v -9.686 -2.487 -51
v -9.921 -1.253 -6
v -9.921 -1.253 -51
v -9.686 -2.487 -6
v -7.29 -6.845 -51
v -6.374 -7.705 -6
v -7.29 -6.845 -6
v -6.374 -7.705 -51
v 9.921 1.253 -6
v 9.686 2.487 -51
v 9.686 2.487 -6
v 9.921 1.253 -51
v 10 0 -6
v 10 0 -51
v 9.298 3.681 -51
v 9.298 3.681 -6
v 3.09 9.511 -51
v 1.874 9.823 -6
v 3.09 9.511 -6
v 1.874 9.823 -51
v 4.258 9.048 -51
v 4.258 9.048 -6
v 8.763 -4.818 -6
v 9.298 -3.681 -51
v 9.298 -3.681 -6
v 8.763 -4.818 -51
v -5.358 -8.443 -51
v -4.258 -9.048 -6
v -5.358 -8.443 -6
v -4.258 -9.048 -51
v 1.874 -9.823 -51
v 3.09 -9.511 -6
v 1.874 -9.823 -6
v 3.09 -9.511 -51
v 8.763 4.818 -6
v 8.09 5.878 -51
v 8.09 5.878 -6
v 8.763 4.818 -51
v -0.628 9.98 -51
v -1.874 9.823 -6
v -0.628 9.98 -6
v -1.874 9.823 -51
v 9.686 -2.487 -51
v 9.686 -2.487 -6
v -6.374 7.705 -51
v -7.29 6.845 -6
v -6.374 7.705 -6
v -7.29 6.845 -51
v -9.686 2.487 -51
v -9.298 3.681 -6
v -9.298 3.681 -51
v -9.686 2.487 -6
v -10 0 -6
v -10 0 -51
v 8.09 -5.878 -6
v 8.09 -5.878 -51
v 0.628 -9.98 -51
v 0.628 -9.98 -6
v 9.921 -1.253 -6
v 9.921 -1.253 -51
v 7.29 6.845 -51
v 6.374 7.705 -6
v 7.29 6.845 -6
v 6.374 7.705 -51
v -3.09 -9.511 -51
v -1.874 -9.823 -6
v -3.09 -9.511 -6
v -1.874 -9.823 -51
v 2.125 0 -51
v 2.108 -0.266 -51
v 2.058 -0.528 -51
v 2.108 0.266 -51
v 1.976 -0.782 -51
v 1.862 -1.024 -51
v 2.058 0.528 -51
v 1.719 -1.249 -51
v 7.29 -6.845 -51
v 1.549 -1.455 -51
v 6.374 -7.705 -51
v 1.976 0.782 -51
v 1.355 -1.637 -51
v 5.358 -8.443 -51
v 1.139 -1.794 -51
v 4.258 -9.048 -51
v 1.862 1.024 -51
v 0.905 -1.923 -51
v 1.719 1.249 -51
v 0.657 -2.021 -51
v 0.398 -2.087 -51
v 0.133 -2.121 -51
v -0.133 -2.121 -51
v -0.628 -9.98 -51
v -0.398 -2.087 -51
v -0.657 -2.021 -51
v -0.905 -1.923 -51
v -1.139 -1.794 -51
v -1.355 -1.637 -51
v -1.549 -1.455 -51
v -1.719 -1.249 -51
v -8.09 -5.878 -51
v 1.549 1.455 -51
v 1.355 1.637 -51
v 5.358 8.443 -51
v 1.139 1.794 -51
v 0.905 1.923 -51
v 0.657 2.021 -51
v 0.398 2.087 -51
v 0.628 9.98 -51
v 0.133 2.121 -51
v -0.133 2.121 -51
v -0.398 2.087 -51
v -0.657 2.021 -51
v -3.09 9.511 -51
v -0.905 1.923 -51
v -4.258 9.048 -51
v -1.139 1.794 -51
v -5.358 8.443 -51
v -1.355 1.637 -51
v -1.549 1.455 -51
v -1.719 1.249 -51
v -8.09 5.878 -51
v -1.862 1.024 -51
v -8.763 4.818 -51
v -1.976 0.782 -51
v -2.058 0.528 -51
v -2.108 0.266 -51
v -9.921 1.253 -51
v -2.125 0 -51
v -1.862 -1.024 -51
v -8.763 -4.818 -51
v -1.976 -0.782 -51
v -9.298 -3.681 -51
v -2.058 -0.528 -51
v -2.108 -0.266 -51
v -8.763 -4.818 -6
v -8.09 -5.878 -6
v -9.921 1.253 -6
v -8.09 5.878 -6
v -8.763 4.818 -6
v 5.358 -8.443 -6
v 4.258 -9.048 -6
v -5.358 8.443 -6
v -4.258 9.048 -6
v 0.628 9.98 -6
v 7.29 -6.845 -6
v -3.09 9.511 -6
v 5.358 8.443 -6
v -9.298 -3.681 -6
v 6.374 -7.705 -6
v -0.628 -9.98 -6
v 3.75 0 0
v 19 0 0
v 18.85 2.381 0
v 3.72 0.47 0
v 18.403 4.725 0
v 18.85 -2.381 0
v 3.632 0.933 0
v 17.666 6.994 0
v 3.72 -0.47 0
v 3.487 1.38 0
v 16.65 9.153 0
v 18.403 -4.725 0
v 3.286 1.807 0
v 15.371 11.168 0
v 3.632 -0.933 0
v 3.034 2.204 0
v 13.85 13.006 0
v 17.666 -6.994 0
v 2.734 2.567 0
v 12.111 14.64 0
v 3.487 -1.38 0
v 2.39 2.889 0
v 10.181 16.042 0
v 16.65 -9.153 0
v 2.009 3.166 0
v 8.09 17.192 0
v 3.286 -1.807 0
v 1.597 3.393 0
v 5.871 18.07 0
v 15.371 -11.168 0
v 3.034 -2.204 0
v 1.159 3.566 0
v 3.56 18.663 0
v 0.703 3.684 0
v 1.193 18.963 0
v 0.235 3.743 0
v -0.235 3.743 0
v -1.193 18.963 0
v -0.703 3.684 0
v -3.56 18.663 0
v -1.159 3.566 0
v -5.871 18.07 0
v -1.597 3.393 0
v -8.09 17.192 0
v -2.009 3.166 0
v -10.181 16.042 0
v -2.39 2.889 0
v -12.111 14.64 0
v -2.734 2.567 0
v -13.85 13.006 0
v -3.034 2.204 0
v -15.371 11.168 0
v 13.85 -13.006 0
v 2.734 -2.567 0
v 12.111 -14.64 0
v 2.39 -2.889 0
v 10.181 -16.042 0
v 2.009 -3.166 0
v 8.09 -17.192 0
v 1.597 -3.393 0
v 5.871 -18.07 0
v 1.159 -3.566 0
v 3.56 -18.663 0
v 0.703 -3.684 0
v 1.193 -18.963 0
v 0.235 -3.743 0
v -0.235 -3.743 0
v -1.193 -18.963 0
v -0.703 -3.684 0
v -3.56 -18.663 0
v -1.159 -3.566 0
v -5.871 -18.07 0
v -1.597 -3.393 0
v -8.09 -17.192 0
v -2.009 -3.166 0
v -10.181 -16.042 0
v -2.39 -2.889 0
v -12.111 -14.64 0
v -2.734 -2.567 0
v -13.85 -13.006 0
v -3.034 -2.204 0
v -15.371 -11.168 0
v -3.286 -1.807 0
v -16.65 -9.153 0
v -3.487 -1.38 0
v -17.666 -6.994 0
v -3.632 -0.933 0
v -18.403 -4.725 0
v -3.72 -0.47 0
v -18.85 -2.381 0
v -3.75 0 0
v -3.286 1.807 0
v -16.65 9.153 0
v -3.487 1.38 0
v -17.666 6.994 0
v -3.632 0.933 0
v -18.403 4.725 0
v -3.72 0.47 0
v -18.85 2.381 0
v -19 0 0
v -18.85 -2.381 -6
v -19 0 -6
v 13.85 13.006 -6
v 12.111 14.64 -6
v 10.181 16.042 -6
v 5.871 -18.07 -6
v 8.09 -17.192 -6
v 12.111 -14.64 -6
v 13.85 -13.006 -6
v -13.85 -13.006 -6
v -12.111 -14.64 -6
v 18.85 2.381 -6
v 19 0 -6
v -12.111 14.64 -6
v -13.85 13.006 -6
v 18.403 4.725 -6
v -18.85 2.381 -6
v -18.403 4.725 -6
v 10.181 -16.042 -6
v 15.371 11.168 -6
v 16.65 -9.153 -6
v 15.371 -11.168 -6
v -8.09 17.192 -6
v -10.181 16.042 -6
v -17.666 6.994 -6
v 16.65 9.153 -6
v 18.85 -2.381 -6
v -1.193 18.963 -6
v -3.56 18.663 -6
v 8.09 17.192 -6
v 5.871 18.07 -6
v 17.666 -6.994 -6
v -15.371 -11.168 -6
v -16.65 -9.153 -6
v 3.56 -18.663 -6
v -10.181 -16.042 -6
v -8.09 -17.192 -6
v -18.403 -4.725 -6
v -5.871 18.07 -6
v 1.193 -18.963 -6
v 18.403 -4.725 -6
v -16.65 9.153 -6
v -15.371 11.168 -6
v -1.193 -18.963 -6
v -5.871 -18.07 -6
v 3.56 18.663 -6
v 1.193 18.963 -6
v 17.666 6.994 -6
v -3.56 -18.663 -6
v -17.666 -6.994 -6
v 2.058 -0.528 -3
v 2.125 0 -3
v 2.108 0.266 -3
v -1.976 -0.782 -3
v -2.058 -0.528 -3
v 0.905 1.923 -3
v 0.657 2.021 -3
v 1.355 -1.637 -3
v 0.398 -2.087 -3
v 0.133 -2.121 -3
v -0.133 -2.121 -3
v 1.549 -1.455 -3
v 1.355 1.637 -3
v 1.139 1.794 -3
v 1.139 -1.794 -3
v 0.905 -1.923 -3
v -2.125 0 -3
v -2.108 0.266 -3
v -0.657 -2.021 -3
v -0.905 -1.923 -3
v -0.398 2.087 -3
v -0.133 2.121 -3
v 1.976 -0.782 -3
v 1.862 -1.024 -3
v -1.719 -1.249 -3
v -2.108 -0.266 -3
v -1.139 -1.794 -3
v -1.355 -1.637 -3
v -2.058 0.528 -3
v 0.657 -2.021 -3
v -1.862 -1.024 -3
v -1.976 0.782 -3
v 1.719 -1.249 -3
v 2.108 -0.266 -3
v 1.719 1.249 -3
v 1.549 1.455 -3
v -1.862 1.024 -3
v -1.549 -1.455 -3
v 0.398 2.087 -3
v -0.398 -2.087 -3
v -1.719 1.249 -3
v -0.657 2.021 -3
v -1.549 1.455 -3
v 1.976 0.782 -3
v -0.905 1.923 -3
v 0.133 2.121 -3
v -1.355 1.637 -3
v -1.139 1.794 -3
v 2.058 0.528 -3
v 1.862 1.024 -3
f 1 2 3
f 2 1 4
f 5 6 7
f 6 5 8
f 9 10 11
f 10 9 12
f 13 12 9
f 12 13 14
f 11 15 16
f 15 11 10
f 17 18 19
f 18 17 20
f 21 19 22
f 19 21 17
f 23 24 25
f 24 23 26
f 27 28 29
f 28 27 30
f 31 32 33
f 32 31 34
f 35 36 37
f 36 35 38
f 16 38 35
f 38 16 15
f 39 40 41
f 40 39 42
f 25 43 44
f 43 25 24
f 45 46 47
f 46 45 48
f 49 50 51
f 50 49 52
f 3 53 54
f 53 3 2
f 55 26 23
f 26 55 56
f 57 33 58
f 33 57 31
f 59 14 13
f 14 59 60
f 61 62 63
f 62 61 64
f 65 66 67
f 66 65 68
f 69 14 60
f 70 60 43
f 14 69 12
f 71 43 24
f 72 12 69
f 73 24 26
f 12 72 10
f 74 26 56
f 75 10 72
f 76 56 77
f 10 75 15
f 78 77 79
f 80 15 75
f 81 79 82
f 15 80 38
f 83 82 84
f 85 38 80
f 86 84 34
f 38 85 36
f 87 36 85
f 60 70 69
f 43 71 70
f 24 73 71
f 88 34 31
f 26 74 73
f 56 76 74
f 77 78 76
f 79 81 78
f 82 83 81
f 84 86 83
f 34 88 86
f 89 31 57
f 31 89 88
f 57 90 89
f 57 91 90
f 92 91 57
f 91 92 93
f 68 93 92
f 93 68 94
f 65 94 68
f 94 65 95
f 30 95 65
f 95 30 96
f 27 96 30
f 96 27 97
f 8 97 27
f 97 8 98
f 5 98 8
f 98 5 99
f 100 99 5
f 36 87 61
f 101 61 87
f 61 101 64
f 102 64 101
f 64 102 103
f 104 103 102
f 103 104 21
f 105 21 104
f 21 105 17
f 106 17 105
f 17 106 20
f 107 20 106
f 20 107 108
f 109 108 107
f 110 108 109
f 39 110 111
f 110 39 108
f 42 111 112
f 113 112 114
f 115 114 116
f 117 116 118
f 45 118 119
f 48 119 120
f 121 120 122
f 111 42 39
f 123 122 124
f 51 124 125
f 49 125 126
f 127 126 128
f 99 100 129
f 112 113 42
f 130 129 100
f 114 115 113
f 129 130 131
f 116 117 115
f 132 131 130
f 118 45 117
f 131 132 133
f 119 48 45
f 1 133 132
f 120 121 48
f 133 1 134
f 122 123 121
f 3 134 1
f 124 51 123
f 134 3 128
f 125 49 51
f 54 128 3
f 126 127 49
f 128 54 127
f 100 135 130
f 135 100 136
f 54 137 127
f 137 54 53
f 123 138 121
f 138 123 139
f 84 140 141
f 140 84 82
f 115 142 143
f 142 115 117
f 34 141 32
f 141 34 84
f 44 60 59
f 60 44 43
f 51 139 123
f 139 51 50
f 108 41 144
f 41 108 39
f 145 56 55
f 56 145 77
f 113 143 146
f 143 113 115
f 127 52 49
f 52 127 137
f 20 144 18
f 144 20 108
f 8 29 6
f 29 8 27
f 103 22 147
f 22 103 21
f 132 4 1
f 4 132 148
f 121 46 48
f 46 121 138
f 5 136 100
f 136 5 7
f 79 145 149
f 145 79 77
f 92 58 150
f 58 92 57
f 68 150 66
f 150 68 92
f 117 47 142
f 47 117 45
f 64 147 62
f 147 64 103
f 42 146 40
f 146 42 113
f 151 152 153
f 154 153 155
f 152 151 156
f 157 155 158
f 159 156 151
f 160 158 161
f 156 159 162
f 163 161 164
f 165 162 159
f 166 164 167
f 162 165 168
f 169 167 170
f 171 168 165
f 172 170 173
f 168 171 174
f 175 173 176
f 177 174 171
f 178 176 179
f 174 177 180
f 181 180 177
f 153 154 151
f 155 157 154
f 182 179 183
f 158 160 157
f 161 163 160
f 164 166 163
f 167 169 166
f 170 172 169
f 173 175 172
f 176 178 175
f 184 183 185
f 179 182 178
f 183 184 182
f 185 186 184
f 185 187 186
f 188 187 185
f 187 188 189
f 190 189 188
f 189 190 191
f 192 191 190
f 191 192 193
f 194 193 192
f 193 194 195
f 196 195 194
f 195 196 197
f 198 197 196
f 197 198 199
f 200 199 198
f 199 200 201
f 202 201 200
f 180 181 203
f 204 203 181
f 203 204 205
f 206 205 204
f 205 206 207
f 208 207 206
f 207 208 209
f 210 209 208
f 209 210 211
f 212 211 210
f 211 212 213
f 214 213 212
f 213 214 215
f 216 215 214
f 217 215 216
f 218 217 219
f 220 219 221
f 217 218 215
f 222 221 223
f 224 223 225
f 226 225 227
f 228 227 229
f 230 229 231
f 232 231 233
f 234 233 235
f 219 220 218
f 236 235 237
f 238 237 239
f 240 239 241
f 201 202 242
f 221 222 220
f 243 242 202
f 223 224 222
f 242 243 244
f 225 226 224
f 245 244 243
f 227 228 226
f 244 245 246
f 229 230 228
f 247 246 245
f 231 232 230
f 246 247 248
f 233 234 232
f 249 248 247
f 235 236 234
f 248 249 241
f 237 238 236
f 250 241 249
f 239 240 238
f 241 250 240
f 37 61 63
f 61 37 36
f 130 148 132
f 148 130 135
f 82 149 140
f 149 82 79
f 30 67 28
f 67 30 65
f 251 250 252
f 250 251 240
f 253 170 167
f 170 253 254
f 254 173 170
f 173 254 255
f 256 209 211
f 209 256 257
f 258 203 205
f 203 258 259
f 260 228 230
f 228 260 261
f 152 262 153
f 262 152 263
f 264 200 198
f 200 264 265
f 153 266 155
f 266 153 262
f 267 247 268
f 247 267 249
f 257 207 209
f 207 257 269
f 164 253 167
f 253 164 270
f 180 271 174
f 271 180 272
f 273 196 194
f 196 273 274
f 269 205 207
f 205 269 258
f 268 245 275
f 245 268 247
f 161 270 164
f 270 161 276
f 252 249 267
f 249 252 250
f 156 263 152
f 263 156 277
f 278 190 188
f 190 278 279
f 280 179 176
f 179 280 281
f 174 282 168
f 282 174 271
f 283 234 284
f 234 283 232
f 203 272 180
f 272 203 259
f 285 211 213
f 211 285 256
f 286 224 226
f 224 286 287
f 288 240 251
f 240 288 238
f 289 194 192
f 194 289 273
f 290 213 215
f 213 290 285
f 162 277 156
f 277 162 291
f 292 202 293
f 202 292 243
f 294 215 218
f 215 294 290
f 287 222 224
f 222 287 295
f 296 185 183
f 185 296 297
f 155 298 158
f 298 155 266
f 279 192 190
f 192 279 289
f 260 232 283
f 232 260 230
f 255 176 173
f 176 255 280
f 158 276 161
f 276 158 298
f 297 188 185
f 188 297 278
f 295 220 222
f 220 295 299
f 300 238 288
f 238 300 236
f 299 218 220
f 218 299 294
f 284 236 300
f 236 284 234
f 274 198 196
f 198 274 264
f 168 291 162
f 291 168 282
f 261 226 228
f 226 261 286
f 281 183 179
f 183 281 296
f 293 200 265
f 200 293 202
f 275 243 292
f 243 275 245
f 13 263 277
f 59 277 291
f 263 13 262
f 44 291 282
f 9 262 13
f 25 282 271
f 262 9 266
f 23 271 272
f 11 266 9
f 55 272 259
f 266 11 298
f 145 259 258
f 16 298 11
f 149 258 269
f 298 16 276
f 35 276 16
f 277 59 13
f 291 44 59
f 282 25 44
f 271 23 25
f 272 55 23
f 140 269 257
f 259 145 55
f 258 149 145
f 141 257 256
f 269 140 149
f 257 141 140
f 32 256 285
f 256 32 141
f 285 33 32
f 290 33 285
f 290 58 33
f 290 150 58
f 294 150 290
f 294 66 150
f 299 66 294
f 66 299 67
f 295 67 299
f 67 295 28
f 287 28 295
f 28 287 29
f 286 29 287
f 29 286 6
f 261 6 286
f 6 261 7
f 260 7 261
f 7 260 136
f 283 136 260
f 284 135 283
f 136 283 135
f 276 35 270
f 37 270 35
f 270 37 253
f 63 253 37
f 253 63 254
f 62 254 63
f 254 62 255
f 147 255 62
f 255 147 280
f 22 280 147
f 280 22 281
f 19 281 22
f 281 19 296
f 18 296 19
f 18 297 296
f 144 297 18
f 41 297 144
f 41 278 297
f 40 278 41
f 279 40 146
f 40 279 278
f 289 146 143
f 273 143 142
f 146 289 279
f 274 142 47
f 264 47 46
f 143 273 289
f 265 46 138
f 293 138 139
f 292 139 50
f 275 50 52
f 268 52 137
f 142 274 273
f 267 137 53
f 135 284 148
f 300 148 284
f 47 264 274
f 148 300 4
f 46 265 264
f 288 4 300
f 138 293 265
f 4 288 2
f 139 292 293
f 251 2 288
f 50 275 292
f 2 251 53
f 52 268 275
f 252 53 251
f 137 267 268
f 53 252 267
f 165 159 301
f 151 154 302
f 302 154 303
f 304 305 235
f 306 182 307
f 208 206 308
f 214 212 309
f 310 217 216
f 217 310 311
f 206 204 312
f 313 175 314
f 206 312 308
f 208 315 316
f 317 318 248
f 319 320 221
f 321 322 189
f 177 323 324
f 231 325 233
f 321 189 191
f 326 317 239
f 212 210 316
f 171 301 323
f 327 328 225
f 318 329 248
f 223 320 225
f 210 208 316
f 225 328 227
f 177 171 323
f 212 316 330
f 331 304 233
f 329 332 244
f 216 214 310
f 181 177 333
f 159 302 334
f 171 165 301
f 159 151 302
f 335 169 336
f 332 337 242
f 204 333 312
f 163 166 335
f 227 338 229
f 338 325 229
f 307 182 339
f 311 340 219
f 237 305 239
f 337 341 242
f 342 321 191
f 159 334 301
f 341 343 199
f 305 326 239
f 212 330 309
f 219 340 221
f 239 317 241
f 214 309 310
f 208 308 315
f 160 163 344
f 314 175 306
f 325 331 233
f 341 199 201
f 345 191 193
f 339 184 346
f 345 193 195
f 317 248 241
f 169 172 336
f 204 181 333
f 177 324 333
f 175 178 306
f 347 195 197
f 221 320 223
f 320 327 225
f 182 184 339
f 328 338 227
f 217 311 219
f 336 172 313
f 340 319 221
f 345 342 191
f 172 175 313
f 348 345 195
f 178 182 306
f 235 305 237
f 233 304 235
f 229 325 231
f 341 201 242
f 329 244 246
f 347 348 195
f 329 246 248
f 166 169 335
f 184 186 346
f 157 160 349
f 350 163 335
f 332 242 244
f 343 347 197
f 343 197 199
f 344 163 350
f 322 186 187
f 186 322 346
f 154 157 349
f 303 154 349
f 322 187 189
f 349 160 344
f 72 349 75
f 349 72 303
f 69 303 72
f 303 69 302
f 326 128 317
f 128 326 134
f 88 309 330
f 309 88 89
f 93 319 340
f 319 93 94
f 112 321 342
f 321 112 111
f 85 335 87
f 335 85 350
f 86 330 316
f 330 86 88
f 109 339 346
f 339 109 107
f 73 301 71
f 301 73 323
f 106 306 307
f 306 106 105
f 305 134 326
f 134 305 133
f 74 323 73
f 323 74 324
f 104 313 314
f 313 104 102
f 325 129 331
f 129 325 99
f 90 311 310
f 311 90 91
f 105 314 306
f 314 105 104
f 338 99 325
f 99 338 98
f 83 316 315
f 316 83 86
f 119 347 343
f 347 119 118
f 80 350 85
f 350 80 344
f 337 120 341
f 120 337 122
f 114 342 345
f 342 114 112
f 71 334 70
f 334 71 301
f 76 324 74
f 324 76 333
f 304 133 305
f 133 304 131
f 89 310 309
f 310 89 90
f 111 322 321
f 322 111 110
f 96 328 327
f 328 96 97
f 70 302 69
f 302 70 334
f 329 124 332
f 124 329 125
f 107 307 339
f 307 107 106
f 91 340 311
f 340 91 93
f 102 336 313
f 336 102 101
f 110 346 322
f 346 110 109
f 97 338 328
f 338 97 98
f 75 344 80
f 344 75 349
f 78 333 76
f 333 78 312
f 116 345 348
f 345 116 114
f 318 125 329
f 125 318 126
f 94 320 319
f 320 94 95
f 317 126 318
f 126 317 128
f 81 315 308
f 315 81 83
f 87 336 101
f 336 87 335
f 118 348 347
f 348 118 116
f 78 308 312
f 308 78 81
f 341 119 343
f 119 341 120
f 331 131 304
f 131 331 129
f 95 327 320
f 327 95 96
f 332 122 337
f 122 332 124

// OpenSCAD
$fn = 50;


difference() {
	union() {
		translate(v = [0, 0, -51.0000000000]) {
			cylinder(h = 51, r = 10.0000000000);
		}
		translate(v = [0, 0, -6.0000000000]) {
			cylinder(h = 6, r = 19.0000000000);
		}
	}
	union() {
		translate(v = [0, 0, 0]) {
			rotate(a = [0, 0, 0]) {
				difference() {
					union() {
						#translate(v = [0, 0, -51.0000000000]) {
							cylinder(h = 51, r = 2.0000000000);
						}
						#translate(v = [0, 0, -3]) {
							cylinder(h = 3, r1 = 2.1250000000, r2 = 3.7500000000);
						}
						#translate(v = [0, 0, -51.0000000000]) {
							cylinder(h = 51, r = 2.1250000000);
						}
						#translate(v = [0, 0, -51.0000000000]) {
							cylinder(h = 51, r = 2.0000000000);
						}
					}
					union();
				}
			}
		}
	}
}
